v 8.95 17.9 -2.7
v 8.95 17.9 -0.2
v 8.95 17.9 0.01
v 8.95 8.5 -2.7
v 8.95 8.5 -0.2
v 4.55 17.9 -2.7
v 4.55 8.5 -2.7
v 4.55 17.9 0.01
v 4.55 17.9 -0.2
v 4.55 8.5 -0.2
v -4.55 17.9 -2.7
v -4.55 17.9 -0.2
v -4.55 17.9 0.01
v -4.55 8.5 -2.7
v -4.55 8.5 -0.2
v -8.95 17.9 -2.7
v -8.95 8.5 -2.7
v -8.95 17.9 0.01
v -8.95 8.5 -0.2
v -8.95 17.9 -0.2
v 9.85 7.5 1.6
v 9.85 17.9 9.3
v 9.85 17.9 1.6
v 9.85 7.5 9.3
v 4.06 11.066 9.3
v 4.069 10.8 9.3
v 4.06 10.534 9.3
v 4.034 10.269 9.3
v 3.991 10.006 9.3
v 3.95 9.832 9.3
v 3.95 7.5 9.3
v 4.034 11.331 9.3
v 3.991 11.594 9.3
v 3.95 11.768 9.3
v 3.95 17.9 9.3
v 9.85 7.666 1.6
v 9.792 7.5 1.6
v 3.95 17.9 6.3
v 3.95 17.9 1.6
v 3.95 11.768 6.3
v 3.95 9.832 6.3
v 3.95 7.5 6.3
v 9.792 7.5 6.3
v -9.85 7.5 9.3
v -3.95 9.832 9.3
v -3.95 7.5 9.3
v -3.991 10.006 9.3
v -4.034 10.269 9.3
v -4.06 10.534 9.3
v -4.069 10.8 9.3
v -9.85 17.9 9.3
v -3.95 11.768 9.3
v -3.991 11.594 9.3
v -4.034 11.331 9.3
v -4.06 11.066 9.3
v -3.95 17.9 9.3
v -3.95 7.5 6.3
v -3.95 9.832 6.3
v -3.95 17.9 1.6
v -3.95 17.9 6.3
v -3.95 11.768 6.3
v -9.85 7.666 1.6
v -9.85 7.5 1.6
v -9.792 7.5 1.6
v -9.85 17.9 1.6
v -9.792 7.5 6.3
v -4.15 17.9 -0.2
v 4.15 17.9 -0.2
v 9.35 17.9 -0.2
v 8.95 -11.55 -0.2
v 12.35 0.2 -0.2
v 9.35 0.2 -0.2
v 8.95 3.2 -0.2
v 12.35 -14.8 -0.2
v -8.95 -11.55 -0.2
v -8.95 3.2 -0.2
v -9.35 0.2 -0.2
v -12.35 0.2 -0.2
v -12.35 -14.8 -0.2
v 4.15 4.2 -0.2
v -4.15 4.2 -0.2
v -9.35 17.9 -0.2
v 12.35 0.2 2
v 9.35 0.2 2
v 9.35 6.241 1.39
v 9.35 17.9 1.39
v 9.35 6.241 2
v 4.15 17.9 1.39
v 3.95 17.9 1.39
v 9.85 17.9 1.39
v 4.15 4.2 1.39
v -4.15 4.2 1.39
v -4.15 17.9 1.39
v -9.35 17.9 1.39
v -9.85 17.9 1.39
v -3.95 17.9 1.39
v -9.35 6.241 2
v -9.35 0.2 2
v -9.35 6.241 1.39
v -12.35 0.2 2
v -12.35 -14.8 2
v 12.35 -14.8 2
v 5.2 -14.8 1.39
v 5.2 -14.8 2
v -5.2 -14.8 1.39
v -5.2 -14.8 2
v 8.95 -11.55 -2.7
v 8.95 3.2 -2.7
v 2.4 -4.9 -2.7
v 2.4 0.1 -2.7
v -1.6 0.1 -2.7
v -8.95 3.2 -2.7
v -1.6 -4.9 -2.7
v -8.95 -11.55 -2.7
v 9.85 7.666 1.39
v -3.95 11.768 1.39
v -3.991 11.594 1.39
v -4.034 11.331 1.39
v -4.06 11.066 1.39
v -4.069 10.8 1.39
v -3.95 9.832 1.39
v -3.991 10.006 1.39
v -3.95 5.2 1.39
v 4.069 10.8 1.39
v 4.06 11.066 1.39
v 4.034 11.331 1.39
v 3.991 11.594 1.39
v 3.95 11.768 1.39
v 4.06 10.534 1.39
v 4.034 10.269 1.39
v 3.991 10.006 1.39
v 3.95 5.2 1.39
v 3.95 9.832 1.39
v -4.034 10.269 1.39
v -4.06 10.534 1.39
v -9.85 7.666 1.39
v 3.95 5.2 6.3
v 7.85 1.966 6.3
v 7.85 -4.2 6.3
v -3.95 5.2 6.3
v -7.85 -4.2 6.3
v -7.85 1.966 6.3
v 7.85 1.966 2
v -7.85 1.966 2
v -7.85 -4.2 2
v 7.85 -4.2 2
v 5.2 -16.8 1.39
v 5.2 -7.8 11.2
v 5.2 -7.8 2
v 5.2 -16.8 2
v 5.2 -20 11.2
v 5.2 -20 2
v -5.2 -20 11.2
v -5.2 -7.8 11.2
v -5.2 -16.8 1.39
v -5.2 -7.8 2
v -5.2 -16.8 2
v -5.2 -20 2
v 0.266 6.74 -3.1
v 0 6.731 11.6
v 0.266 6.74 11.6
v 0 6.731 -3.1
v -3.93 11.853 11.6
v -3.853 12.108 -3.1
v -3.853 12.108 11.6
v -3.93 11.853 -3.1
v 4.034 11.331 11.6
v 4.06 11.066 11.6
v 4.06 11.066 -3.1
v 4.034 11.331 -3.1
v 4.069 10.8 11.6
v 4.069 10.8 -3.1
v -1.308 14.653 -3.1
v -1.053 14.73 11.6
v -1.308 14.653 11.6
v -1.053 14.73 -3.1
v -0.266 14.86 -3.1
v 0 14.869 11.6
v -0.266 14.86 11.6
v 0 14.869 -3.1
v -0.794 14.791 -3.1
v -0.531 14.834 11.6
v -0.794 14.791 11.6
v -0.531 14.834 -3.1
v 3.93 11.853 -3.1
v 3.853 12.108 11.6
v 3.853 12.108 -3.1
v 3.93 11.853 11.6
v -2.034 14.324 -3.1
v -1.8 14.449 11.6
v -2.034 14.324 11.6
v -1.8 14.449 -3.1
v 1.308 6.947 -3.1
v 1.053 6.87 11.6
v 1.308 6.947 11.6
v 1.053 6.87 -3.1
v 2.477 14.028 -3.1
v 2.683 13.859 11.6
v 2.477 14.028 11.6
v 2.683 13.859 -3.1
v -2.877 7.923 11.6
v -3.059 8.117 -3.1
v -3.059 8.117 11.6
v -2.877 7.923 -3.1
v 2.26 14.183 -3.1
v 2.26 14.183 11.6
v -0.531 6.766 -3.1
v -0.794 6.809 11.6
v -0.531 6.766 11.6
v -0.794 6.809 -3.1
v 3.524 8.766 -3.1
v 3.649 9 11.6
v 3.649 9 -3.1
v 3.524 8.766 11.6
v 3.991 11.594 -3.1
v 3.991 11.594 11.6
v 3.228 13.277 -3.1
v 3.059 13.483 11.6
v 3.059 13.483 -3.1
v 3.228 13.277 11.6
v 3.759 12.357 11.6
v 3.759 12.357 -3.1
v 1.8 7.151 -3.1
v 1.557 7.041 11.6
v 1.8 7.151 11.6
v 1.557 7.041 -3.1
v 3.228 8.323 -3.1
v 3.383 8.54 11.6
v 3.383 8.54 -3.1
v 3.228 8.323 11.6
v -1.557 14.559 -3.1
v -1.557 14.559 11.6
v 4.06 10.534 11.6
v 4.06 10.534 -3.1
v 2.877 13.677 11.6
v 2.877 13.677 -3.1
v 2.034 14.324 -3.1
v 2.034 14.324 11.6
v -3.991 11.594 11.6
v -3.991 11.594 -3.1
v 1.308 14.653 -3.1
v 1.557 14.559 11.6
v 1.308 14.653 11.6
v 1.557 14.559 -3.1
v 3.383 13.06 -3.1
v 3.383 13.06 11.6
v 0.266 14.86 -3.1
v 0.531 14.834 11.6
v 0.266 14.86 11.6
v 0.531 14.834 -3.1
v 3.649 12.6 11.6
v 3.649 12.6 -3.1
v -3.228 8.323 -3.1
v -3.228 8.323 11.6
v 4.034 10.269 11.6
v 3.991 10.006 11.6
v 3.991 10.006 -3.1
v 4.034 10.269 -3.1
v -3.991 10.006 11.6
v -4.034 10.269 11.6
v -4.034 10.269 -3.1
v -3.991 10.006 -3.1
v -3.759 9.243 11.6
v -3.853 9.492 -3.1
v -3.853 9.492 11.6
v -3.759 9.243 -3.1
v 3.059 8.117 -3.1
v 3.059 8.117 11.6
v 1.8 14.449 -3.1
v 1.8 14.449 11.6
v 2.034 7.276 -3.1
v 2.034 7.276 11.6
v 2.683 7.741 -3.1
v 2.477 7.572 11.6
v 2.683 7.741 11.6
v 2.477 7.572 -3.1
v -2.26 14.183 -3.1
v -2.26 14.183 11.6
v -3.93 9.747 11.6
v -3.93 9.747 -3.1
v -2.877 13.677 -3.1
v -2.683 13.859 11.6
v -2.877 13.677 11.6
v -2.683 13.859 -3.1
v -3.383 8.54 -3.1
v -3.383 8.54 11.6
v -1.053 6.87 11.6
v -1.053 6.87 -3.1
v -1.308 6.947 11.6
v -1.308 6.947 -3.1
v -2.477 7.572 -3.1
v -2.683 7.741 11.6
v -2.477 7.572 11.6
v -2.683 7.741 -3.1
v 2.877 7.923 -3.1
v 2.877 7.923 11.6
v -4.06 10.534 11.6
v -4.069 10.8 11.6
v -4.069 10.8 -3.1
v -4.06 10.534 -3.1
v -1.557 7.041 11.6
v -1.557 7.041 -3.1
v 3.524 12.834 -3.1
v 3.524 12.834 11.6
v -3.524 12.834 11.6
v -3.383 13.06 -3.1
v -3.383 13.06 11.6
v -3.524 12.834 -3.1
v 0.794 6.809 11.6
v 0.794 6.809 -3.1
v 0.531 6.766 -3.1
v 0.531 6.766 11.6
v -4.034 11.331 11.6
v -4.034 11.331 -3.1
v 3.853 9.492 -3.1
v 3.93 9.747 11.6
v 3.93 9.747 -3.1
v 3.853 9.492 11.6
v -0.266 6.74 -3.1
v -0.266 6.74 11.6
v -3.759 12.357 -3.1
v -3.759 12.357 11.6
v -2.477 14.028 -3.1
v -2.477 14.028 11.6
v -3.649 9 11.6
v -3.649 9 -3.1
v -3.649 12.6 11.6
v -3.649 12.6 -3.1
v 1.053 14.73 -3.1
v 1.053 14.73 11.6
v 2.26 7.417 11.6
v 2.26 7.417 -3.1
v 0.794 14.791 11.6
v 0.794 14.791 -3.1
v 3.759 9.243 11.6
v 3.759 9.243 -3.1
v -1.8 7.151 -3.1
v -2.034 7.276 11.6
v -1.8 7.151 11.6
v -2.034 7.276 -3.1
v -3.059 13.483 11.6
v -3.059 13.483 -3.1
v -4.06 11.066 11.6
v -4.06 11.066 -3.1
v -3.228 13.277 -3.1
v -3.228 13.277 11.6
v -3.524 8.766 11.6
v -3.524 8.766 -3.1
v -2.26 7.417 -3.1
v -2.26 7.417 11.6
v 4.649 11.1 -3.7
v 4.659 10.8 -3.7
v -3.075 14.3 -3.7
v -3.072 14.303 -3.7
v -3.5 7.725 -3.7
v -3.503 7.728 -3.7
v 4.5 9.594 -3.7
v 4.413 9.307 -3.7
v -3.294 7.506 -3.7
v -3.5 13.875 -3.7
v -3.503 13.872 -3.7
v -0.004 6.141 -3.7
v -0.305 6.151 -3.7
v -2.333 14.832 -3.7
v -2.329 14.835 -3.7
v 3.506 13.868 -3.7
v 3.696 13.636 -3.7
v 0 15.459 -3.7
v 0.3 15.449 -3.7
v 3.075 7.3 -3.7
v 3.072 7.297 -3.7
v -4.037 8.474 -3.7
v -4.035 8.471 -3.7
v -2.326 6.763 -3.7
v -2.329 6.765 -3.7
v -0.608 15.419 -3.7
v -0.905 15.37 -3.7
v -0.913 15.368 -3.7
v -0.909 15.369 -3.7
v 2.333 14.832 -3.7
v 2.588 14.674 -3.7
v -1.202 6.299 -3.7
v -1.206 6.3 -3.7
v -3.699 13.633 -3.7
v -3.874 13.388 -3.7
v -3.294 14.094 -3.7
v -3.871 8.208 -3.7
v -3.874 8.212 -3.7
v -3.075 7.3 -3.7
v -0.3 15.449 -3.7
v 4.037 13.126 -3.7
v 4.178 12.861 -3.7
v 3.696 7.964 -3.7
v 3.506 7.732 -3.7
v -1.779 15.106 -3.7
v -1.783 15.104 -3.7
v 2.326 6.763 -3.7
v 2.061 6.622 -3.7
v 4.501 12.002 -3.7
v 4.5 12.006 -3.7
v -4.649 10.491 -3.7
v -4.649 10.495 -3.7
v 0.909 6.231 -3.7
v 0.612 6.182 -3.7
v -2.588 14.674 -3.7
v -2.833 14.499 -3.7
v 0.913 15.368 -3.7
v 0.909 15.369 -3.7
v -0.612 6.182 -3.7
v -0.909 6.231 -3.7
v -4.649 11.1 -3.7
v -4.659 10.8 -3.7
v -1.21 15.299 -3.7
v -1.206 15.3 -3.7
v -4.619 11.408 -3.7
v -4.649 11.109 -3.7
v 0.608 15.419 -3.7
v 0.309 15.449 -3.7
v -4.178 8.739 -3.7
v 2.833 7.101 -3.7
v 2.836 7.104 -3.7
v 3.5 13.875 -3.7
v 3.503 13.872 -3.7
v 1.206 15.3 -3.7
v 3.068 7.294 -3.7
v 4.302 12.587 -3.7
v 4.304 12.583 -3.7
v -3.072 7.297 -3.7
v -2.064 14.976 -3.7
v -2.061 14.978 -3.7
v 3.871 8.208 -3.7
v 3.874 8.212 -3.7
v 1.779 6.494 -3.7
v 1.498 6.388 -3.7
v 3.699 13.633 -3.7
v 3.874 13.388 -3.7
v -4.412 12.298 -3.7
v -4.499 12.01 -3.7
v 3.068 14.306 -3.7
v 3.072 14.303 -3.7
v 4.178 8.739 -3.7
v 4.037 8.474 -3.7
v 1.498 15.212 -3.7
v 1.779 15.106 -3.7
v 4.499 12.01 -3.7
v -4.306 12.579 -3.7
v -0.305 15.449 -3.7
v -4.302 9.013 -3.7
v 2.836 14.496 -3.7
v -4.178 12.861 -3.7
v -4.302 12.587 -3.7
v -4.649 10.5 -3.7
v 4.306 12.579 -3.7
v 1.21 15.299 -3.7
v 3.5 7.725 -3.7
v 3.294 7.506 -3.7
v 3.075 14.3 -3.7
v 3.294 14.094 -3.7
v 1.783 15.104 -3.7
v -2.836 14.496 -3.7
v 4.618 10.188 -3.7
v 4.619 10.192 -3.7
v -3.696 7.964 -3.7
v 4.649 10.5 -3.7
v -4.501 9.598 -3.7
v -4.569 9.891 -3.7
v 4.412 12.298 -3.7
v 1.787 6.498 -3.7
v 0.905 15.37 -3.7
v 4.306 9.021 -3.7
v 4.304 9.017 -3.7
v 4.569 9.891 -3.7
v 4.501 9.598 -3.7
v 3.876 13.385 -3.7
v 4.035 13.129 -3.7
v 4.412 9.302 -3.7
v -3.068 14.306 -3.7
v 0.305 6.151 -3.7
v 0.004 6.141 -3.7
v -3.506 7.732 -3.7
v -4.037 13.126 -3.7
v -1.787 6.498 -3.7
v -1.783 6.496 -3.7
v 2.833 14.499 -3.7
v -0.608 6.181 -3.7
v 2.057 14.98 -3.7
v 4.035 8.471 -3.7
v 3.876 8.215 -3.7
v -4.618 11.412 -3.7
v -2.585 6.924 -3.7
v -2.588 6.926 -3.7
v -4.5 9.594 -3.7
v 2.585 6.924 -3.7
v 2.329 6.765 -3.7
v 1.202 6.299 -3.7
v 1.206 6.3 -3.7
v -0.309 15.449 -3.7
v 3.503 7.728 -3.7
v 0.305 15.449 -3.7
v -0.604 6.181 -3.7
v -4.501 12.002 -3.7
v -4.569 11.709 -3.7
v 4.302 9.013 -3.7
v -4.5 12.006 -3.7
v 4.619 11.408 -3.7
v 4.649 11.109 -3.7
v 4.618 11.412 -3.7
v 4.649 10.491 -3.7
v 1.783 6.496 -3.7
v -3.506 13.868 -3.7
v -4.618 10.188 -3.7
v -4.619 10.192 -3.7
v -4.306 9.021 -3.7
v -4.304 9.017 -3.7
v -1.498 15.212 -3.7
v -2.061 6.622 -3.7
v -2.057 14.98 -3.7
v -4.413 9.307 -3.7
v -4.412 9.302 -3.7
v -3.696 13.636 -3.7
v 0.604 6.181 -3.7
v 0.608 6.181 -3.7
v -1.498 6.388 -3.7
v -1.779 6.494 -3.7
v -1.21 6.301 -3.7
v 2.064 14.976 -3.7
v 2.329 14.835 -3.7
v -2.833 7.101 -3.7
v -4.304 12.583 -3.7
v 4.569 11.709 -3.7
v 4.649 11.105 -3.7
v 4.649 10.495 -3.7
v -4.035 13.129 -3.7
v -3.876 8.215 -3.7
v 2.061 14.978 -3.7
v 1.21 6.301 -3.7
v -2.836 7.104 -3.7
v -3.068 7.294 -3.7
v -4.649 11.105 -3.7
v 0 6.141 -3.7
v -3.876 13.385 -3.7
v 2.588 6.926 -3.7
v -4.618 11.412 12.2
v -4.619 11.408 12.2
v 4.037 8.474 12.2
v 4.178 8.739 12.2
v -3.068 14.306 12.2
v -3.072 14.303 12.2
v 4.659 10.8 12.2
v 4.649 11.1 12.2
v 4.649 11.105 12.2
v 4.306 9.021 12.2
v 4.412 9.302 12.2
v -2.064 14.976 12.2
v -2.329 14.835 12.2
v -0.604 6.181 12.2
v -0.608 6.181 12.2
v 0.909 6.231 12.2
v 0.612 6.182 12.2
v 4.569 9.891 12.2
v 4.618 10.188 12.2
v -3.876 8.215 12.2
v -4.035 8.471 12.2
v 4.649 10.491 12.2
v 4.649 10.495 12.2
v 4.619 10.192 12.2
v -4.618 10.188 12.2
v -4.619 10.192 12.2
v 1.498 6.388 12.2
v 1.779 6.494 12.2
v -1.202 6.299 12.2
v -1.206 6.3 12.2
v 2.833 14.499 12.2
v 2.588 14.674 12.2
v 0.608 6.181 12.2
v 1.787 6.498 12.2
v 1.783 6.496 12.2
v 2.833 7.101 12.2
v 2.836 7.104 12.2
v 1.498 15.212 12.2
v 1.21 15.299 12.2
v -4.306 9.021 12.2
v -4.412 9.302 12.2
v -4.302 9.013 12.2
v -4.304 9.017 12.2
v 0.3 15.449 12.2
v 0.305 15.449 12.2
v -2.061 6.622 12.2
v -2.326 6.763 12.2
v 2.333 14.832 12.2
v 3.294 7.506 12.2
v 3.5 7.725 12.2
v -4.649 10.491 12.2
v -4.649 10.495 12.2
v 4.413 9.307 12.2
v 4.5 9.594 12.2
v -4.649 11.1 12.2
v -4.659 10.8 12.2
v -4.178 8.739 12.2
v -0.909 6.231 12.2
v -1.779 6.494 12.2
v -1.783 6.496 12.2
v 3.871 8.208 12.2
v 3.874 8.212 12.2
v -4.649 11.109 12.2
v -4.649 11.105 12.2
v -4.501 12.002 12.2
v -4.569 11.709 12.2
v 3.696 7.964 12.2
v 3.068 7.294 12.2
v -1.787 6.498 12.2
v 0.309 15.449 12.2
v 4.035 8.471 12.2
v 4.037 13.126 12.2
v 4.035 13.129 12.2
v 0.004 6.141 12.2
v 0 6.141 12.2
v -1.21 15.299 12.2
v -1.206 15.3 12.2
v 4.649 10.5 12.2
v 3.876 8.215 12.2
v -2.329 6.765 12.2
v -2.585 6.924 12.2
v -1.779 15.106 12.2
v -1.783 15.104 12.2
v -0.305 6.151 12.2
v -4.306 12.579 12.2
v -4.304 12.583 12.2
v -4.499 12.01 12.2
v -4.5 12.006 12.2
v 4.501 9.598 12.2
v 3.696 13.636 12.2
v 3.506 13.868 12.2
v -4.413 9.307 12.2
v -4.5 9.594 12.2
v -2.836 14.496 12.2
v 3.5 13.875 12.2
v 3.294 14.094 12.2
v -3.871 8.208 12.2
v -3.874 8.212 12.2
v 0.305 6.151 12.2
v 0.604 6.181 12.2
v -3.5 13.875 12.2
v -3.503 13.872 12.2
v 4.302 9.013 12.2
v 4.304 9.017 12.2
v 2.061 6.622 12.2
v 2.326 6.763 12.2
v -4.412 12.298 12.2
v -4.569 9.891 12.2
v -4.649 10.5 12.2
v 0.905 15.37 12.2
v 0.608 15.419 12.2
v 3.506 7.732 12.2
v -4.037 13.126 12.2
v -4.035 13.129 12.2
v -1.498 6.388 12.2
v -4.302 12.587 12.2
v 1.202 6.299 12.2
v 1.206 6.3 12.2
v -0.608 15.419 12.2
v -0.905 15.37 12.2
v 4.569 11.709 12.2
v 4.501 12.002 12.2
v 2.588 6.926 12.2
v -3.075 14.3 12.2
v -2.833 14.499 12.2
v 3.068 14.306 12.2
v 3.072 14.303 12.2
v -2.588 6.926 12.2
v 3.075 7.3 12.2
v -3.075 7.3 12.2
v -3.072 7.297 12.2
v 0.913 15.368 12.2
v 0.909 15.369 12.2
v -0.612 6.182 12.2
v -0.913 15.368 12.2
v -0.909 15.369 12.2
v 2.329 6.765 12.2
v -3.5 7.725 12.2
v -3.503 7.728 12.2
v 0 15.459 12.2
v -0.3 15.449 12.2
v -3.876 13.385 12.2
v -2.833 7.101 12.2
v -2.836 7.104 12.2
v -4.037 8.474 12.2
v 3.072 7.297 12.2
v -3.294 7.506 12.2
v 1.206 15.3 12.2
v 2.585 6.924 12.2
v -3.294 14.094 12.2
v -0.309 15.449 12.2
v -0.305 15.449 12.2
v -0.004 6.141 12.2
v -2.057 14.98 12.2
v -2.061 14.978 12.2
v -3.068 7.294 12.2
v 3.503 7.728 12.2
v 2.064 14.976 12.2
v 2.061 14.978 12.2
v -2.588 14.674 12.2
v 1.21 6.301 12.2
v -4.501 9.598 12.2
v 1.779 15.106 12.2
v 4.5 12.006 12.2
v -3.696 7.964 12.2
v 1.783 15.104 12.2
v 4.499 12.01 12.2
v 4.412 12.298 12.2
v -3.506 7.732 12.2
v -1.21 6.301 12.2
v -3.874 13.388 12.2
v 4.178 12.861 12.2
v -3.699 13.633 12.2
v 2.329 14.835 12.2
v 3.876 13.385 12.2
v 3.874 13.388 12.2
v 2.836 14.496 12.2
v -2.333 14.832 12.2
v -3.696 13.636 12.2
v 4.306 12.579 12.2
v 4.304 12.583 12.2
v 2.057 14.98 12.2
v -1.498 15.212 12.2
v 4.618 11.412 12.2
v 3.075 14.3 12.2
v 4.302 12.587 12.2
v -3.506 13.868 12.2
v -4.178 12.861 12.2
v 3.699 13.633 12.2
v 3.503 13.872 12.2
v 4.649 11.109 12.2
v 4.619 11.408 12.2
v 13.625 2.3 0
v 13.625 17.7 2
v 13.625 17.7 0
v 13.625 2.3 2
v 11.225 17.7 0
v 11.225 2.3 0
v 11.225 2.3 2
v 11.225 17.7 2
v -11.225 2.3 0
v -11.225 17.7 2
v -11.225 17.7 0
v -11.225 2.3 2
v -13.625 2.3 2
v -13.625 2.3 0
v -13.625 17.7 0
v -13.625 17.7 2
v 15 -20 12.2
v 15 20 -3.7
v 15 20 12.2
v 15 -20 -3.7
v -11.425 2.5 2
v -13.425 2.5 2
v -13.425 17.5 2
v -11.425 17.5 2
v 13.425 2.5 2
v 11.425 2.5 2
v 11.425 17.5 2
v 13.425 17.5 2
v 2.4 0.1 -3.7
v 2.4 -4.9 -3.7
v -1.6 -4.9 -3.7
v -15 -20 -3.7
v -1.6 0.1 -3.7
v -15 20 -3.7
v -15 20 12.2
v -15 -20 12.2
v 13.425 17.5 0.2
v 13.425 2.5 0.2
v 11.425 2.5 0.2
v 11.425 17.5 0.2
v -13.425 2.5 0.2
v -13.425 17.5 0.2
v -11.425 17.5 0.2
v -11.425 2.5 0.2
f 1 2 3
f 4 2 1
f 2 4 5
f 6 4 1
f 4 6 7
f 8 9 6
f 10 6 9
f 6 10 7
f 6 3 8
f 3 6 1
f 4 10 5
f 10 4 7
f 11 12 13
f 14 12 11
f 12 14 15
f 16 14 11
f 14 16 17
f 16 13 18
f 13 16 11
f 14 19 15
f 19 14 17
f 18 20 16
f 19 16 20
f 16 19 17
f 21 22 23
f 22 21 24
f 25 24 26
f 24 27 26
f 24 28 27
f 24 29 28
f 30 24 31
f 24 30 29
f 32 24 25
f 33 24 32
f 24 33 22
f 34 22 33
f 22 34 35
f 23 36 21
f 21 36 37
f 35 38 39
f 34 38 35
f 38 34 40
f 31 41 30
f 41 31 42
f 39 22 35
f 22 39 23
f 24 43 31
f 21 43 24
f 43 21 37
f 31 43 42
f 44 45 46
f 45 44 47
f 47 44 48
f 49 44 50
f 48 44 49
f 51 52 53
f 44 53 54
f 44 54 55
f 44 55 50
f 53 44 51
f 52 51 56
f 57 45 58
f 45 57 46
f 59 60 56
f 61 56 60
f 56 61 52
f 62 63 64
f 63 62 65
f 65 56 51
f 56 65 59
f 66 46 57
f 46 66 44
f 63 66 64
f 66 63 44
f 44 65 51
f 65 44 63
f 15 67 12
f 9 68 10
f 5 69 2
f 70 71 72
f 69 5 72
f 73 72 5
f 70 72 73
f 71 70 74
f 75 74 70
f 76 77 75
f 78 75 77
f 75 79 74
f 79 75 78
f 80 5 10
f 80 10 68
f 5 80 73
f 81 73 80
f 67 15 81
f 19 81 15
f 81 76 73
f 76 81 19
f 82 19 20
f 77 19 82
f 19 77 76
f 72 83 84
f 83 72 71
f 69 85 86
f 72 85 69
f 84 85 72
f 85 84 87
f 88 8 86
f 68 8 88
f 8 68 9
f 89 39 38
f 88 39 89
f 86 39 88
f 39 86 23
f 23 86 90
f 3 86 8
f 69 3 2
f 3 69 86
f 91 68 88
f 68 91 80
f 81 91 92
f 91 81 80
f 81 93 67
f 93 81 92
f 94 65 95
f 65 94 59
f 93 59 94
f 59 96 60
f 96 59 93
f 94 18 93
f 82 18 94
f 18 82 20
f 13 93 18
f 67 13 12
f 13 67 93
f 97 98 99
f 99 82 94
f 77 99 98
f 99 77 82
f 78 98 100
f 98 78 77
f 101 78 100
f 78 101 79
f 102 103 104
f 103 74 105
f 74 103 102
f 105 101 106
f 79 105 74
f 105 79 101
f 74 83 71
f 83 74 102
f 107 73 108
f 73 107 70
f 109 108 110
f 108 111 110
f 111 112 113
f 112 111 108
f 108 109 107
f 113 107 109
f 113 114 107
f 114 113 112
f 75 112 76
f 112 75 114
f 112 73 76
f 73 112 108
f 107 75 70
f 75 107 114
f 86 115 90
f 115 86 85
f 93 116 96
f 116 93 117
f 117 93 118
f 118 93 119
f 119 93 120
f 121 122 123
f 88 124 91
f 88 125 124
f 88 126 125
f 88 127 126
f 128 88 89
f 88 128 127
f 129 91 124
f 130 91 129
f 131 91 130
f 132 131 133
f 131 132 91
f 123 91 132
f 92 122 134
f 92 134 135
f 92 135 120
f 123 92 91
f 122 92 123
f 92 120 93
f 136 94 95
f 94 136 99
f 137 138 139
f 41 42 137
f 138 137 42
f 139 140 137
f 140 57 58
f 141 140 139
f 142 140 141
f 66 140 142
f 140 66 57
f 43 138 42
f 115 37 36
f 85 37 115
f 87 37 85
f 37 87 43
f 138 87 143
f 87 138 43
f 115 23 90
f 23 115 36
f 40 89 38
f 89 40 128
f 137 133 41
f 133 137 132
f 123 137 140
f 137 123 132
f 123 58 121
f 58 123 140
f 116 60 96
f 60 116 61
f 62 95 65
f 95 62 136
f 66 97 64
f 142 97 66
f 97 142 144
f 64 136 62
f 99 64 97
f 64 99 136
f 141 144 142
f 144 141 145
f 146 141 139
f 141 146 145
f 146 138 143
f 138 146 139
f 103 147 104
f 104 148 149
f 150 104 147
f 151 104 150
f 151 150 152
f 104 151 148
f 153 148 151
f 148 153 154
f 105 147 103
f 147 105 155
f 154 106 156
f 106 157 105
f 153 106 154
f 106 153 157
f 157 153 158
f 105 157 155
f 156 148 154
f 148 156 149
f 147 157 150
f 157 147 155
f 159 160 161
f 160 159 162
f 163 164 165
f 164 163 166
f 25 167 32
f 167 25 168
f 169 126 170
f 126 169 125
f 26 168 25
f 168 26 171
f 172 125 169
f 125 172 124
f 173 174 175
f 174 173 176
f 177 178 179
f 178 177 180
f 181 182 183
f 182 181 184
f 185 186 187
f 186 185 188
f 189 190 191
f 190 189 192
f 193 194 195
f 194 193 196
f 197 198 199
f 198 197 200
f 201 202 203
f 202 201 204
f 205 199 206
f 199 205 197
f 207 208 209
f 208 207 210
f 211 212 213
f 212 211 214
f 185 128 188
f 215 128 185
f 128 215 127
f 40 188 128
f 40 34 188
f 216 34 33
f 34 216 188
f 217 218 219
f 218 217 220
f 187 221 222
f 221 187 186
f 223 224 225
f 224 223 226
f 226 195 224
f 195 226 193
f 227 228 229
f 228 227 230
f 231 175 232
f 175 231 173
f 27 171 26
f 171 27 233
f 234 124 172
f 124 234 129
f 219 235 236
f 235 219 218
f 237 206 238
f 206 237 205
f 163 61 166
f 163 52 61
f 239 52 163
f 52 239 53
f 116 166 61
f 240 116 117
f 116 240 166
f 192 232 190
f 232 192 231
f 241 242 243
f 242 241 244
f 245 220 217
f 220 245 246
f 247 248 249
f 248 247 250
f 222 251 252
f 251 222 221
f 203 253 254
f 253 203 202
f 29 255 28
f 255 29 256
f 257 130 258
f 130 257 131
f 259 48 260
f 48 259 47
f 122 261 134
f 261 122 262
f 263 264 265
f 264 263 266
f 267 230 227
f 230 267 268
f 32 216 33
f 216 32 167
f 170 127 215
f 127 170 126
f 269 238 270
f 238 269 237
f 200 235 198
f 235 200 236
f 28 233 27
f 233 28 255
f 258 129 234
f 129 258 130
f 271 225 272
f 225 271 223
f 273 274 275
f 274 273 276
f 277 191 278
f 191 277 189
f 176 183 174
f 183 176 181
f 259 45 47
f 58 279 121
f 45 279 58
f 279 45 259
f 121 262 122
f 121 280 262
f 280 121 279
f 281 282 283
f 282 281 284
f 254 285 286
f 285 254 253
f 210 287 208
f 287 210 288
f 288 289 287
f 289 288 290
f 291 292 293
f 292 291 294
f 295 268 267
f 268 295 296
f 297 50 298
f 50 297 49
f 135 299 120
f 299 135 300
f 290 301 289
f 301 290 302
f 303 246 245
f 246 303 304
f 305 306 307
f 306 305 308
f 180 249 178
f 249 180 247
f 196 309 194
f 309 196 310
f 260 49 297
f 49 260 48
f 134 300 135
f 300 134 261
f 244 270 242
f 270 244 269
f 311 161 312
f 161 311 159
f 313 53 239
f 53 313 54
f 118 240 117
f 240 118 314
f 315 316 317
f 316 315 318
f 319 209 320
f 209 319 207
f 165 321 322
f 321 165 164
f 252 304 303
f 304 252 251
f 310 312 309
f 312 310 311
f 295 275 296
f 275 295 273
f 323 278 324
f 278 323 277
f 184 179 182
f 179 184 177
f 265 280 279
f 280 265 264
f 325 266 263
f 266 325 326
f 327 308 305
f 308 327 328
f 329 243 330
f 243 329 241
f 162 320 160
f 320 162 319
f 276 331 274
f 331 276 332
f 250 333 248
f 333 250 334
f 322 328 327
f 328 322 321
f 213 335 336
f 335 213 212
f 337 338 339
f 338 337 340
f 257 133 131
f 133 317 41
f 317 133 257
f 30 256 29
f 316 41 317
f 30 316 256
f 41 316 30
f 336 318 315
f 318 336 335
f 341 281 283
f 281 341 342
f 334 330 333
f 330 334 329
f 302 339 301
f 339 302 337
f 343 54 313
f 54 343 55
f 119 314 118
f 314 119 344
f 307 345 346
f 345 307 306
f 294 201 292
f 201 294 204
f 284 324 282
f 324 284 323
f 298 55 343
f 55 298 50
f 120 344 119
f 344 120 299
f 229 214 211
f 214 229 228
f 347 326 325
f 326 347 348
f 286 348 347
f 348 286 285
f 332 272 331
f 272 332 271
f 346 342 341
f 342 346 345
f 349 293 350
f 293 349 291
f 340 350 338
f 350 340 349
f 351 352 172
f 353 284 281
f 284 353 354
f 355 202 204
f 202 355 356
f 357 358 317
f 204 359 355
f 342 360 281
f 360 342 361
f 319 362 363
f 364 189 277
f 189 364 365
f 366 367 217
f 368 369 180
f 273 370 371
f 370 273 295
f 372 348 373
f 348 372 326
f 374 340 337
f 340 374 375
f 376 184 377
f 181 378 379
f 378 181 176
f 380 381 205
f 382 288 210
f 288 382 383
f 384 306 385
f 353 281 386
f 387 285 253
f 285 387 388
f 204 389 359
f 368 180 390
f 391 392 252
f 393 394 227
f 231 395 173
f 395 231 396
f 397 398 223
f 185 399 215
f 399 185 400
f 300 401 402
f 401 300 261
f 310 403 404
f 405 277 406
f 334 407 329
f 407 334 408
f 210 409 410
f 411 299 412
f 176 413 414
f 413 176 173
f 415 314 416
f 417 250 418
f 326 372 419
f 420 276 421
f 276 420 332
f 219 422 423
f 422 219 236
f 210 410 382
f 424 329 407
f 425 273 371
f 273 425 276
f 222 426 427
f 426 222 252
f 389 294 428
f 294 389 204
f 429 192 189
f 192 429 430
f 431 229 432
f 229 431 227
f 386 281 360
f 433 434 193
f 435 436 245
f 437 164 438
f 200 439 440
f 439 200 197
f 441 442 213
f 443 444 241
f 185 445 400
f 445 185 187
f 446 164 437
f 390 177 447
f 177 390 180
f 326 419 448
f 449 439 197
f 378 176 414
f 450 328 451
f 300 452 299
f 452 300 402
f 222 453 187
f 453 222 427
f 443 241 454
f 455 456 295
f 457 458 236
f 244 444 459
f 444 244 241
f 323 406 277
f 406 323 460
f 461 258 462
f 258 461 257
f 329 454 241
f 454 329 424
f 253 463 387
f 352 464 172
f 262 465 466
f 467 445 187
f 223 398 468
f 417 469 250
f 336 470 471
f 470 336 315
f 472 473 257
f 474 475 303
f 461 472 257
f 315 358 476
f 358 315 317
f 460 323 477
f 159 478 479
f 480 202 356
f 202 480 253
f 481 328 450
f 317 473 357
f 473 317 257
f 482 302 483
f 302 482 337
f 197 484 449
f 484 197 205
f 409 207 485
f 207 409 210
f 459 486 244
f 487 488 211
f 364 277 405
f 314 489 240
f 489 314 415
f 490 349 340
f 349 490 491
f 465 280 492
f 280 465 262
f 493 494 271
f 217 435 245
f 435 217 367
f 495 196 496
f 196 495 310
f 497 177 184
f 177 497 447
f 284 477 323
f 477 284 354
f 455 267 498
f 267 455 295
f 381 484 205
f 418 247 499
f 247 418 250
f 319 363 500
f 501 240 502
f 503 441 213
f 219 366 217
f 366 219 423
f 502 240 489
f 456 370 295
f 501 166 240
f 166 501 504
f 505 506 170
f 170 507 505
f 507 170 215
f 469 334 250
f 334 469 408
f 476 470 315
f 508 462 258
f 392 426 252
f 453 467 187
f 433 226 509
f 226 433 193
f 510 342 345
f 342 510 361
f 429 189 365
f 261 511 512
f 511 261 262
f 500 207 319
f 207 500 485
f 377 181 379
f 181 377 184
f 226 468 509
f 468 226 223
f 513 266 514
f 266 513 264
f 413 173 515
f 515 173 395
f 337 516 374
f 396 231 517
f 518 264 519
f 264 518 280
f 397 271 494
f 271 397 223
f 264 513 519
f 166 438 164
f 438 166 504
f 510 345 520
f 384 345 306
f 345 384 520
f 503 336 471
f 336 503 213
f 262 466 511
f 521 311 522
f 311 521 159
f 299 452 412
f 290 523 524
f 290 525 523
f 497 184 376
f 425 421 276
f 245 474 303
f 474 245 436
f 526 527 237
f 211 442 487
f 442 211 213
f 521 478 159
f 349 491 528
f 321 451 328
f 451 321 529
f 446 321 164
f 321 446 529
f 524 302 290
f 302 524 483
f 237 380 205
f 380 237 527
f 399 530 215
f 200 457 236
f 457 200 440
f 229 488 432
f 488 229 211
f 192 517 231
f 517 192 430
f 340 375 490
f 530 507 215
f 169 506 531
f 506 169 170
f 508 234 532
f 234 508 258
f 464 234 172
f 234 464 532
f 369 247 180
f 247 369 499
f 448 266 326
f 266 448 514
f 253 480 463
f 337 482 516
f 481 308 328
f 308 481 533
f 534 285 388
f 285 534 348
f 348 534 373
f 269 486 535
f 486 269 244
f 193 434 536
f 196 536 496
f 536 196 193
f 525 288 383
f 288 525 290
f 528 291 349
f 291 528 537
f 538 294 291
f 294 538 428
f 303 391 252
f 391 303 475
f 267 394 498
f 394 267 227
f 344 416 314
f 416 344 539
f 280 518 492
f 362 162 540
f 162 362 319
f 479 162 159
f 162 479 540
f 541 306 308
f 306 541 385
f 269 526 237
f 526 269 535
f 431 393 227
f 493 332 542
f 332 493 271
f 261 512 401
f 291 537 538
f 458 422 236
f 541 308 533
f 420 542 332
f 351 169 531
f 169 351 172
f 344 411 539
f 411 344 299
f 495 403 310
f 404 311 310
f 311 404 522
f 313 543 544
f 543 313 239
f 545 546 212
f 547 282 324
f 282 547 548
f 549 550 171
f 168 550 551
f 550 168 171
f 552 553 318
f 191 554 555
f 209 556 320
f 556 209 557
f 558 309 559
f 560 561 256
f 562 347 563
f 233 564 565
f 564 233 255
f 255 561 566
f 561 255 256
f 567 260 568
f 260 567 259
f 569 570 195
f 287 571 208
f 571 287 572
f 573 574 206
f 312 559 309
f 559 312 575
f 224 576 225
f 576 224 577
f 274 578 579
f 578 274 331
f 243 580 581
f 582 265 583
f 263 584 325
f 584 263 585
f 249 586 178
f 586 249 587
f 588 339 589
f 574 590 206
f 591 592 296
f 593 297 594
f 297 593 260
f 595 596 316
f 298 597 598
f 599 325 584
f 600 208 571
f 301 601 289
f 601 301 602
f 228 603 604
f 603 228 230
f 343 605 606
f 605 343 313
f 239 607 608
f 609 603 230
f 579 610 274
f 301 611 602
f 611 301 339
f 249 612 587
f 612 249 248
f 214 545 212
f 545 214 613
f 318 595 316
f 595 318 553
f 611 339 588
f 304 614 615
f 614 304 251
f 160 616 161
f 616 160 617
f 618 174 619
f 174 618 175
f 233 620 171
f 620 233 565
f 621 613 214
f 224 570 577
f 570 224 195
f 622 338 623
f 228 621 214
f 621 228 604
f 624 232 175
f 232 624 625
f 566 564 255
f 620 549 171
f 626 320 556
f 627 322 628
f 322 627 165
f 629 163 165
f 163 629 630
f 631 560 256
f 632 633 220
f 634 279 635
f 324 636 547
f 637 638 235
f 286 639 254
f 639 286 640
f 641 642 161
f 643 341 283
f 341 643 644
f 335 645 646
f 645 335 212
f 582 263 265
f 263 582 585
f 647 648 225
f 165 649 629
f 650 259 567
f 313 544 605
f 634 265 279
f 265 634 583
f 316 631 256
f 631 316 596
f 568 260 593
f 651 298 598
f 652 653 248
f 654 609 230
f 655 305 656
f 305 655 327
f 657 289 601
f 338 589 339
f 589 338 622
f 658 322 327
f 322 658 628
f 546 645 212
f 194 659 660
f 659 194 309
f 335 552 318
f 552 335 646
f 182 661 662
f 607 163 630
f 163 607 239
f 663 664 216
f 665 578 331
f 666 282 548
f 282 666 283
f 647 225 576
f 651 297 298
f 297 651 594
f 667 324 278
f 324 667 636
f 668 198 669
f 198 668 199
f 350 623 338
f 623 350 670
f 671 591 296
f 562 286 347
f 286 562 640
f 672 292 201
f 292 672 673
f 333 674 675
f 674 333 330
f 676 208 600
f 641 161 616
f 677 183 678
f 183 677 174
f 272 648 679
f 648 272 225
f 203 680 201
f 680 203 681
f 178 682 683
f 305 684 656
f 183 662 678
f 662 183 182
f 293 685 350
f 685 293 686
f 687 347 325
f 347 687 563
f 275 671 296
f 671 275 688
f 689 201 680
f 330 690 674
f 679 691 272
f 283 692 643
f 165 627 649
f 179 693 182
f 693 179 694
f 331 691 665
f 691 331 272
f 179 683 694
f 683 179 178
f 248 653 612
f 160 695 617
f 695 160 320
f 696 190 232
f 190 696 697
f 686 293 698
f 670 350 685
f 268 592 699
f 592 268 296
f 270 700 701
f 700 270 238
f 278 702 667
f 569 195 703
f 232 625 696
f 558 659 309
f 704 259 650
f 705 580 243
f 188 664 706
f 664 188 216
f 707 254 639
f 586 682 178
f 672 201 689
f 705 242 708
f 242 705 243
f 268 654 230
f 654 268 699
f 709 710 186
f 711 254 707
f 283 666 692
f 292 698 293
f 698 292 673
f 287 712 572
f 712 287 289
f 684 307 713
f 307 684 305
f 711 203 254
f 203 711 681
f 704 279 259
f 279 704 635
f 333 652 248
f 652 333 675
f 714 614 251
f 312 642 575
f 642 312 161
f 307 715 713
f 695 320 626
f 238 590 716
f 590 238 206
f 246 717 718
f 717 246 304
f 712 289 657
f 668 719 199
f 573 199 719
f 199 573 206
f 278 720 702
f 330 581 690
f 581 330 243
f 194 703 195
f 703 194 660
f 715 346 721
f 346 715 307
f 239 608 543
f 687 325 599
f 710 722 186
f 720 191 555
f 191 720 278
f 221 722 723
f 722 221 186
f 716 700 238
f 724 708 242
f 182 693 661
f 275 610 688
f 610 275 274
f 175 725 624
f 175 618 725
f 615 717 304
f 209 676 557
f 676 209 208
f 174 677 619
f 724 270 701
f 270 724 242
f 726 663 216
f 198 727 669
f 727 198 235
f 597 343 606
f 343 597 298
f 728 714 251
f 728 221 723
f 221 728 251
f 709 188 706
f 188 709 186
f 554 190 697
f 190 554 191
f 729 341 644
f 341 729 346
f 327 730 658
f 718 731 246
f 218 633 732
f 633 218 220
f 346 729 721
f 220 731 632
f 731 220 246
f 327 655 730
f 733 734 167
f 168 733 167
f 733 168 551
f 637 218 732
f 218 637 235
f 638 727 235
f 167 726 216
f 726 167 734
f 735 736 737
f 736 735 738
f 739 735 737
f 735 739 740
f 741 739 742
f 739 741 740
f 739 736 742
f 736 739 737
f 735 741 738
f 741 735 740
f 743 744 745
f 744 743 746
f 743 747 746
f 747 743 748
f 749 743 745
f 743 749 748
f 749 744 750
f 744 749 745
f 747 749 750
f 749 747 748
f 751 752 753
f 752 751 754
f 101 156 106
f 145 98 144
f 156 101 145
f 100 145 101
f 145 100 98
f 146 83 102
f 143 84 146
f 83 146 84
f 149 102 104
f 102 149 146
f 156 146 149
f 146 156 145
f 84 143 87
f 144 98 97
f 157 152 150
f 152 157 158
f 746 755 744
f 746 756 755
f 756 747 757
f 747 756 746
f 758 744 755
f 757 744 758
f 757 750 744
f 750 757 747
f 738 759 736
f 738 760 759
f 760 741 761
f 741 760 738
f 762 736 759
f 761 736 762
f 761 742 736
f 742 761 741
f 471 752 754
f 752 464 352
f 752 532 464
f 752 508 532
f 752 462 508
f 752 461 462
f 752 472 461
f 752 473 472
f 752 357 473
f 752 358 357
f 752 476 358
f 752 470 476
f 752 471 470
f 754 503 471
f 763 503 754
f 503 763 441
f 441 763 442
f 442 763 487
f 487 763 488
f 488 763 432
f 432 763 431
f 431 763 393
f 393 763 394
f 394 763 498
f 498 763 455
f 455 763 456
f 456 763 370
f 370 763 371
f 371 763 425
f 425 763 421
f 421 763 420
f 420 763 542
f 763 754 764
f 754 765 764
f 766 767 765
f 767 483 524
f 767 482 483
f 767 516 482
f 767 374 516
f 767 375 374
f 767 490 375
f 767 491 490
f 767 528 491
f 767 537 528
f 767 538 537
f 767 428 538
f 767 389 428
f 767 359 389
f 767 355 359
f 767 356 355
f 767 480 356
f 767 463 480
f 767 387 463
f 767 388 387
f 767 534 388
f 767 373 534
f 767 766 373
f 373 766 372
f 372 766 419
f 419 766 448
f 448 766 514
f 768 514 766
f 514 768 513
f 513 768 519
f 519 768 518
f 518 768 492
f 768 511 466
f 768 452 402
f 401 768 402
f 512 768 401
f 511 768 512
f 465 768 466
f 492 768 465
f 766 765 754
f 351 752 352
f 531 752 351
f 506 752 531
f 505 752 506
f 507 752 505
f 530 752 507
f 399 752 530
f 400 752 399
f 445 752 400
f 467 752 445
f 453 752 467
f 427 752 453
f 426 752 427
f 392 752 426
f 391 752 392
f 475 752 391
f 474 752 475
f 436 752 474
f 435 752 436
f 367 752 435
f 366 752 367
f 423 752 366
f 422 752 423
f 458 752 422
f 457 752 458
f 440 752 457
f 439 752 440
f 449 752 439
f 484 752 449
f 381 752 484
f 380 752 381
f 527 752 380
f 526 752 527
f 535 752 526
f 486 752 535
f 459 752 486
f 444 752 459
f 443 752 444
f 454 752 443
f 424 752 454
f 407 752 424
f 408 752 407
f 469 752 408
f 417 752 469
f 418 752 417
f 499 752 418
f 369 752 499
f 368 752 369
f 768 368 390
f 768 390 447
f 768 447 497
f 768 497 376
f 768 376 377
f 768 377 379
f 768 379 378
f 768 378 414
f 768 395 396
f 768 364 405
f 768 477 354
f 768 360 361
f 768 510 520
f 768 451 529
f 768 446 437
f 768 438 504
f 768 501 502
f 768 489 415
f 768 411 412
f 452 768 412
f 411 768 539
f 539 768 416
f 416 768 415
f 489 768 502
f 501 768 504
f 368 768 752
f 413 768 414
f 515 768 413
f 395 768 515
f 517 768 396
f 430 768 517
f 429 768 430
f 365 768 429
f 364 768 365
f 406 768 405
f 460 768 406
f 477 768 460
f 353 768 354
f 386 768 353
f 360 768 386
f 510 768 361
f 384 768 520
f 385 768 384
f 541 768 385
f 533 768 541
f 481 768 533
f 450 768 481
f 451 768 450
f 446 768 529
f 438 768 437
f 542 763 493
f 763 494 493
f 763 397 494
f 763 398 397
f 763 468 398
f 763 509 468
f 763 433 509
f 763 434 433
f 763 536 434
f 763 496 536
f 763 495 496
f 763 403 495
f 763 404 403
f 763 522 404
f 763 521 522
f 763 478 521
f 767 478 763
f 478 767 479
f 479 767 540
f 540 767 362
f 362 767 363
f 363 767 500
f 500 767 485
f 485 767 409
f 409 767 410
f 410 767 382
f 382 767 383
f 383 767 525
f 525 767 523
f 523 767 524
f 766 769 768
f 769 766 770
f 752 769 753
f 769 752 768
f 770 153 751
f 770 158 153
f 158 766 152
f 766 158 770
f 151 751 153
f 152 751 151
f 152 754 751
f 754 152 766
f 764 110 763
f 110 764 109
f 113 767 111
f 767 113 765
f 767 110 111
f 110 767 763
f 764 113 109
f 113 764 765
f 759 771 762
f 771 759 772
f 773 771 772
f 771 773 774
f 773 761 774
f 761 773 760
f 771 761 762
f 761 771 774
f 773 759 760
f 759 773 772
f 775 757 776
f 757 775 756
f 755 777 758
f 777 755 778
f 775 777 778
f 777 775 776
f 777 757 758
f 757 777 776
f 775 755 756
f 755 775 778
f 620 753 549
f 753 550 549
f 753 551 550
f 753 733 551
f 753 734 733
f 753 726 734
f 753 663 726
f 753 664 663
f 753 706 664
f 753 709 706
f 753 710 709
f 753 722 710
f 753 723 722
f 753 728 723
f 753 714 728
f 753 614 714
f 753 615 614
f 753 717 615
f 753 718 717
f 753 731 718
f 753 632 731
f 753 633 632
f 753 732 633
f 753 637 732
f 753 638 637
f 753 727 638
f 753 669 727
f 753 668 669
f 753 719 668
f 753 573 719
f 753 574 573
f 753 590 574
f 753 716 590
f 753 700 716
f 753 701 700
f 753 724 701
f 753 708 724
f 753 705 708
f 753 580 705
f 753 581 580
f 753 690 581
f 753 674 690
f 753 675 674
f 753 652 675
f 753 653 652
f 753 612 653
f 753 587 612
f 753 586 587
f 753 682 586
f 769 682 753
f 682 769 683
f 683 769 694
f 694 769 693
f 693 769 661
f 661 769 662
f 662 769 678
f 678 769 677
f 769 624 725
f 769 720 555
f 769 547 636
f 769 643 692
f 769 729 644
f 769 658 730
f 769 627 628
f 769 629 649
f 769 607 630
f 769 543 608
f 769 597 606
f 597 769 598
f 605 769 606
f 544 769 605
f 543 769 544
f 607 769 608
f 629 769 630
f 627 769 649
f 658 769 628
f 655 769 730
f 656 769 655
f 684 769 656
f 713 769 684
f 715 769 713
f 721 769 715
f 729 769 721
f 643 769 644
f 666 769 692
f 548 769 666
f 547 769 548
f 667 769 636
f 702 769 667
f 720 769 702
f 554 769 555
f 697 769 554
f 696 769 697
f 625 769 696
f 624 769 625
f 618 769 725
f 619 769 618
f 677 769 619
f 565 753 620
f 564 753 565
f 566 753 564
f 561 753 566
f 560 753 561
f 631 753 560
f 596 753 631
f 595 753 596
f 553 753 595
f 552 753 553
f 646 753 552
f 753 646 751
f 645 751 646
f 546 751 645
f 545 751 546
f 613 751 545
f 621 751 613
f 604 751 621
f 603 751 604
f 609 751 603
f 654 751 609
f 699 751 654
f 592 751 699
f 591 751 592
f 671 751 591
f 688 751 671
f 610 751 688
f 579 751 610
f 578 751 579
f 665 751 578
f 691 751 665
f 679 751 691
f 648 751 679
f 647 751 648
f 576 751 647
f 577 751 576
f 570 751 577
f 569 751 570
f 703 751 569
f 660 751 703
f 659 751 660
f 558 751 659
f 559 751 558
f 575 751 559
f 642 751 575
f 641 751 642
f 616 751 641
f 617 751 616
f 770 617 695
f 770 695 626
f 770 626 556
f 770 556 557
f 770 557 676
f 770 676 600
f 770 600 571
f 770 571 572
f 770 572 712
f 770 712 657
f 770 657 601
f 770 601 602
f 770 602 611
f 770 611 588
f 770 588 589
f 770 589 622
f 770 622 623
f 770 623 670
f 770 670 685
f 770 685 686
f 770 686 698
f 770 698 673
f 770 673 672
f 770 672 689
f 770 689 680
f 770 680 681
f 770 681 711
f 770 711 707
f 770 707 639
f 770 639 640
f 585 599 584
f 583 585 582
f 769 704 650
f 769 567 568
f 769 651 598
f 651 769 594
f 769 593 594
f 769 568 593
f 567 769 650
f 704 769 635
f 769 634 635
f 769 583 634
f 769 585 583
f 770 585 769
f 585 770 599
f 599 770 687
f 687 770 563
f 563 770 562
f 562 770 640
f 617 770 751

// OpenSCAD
// file: ../probe/probe.scad
// Library model of the probe board inside an Amphenol TSW-10 or TST-10 turbidity probe (the board
// is the same in both), for building cases around. It draws nothing itself.
//
// The board: a PCB with an emitter and a detector head on a U-shaped bracket, facing each other
// across a slot, and a right-angle 3-pin connector at the other end. A clear tube runs vertically
// through the slot, between the heads.
//
// Frame: origin on the PCB centreline, z = 0 at the PCB underside, +y toward the head arms, -y
// toward the connector, whose plug enters from -y.
//
// The dimensions come from a CAD model drawn from caliper measurements, and matched the board
// used for the tube case. After remeasuring, change them here and every case follows. The
// heights of the bracket and the heads were measured from the top face of the PCB, and are
// stored that way.
//
// Use it with `use <probe.scad>`:
//   probe(c)               the board grown by c on every side, to subtract from a case
//   probe_outline()        the PCB outline (2D), to open a pocket to a parting plane
//   probe_bbox(c)          [[x0, y0, z0], [x1, y1, z1]] of probe(c)
//   probe_optical_axis()   [x, y] where a tube passes between the heads
//   probe_gap()            the gap between the inner faces of the heads: the widest tube that fits
//   probe_heads()          [x0, x1, y0, y1, z1]: inner and outer faces of one head, its y extent
//                          (the other head mirrors it in x) and its top
//   probe_pcb()            [thickness, half-width of the body, the y where it narrows to the arms]
//   probe_connector()      [half-width, plug face y, back face y, top z]
//   probe_trimmer()        [x, y] of the RV trimmer centre, under the PCB

// PCB thickness
pcb_t = 1.60;
// half-width of the PCB body
pcb_hw = 12.15;
// connector-end edge (y)
pcb_y0 = -14.6;
// where the PCB narrows to the two arms (y)
pcb_neck_y = 0.0;
// arm inner edge (half the slot width)
pcb_arm_x0 = 4.35;
// arm outer edge
pcb_arm_x1 = 9.15;
// bottom of the PCB slot (y)
pcb_slot_y = 4.0;
// arm tips (y)
pcb_y1 = 17.7;

// height of the black head bracket above the top face of the PCB
bracket_h = 4.5;
// bracket root edge (y)
bracket_y0 = -4.0;
// bracket half-width at the root
bracket_hw0 = 7.65;
// the root widens to the head width from here (y)
flare_y0 = 2.0;
// to here (y)
flare_y1 = 7.7;
// head inner face (half the optical gap)
head_x0 = 4.15;
// head outer face
head_x1 = 9.65;
// bottom of the bracket slot (y)
bracket_slot_y = 5.0;

// height of the emitter and detector heads above the top face of the PCB, over y flare_y1..pcb_y1
head_h = 7.5;

// Optical axis of the emitter and detector along the arms (y): the centre of the lens windows on
// the inner faces of the heads, measured from the root of the arms. The windows are 1.4 wide by
// 2.6 tall.
optical_y = 10.8;

// right-angle connector half-width; the plug enters from -y
conn_hw = 5.0;
// connector plug face (y)
conn_y0 = -16.6;
// connector back face (y)
conn_y1 = -8.0;
// connector top (z)
conn_top = 11.0;

// depth of the solder joints, trimmer and legs below the PCB
under_d = 2.5;
// main underside relief half-width
under_hw = 8.75;
// main relief start (y)
under_y0 = -11.35;
// main relief end (y)
under_y1 = 3.0;
// inner edge of the relief under each arm
under_arm_x0 = 4.75;
// start of the relief under each arm (y)
under_arm_y0 = 8.7;
// RV trimmer centre, underside (x)
trim_x = 0.4;
// RV trimmer centre, underside (y)
trim_y = -2.4;

eps = 0.01;

bracket_top = pcb_t + bracket_h;
head_top = pcb_t + head_h;

function probe_optical_axis() = [0, optical_y];
function probe_gap() = 2 * head_x0;
function probe_heads() = [head_x0, head_x1, flare_y1, pcb_y1, head_top];
function probe_pcb() = [pcb_t, pcb_hw, pcb_neck_y];
function probe_connector() = [conn_hw, conn_y0, conn_y1, conn_top];
function probe_trimmer() = [trim_x, trim_y];
function probe_bbox(c = 0) =
  let (hw = max(pcb_hw, bracket_hw0, head_x1, conn_hw, under_hw) + c)
    [
      [-hw, min(pcb_y0, conn_y0, under_y0) - c, -under_d - c],
      [hw, pcb_y1 + c, max(conn_top, head_top, bracket_top, pcb_t) + c],
    ];

module probe_mirror_x() {
  children();
  mirror([1, 0, 0]) children();
}

// Cuboid between two corners.
module probe_box(p0, p1) {
  translate(p0) cube(p1 - p0);
}

module probe_outline() {
  polygon(
    [
      [-pcb_hw, pcb_y0],
      [pcb_hw, pcb_y0],
      [pcb_hw, pcb_neck_y],
      [pcb_arm_x1, pcb_neck_y],
      [pcb_arm_x1, pcb_y1],
      [pcb_arm_x0, pcb_y1],
      [pcb_arm_x0, pcb_slot_y],
      [-pcb_arm_x0, pcb_slot_y],
      [-pcb_arm_x0, pcb_y1],
      [-pcb_arm_x1, pcb_y1],
      [-pcb_arm_x1, pcb_neck_y],
      [-pcb_hw, pcb_neck_y],
    ]
  );
}

module probe_bracket_outline() {
  polygon(
    [
      [-bracket_hw0, bracket_y0],
      [bracket_hw0, bracket_y0],
      [bracket_hw0, flare_y0],
      [head_x1, flare_y1],
      [head_x1, pcb_y1],
      [head_x0, pcb_y1],
      [head_x0, bracket_slot_y],
      [-head_x0, bracket_slot_y],
      [-head_x0, pcb_y1],
      [-head_x1, pcb_y1],
      [-head_x1, flare_y1],
      [-bracket_hw0, flare_y0],
    ]
  );
}

// The board, grown by c on every side. c = 0 is the board itself.
module probe(c = 0) {
  // PCB
  translate([0, 0, -c]) linear_extrude(pcb_t + 2 * c) offset(delta=c) probe_outline();
  // underside relief
  probe_box([-under_hw - c, under_y0 - c, -under_d - c], [under_hw + c, under_y1 + c, eps]);
  probe_mirror_x()
    probe_box([under_arm_x0 - c, under_arm_y0 - c, -under_d - c], [under_hw + c, pcb_y1 + c, eps]);
  // bracket and heads; the bracket and the connector overhang the PCB edge,
  // so they get clearance underneath too
  translate([0, 0, pcb_t - c - eps])
    linear_extrude(bracket_top - pcb_t + 2 * c + eps) offset(delta=c) probe_bracket_outline();
  probe_mirror_x() probe_box([head_x0 - c, flare_y1 - c, pcb_t], [head_x1 + c, pcb_y1 + c, head_top + c]);
  // connector
  probe_box([-conn_hw - c, conn_y0 - c, pcb_t - c - eps], [conn_hw + c, conn_y1 + c, conn_top + c]);
}
// main file
// Tube case: a printed case for the bare DFRobot SEN0189 probe board.
//
// The stock probe housing is removed. The bare probe PCB (emitter and detector
// heads on a U-shaped bracket, right-angle 3-pin connector) drops into the base,
// the lid closes over it, and a clear tube runs vertically through the optical
// slot between the heads.
//
// Frame: origin on the PCB centreline, z = 0 at the PCB underside, +y toward the
// head arms, -y toward the connector. The base sits below z = split_z, the lid above.
//
// Every pocket in both parts is cut from one board envelope grown by `clr`, so the
// two parts always agree on where the board is. The board, its envelope and its
// dimensions are defined in ../probe/probe.scad. This file adds only the case
// parameters.
//
// Export both parts with `just tube-case`.

use <../probe/probe.scad>

/* [Output] */

// which part(s) to render; "none" renders nothing, for files that include this one
part = "assembly"; // [assembly, base, lid, none]
// print: lay base or lid flat side down at z = 0 (ignored for the assembly)
orient = "assembly"; // [assembly, print]

/* [Fit] */
// clearance around the board envelope, per side
clr = 0.2; // [0:0.05:0.5]
// 5/16 in clear tube, nominal outside diameter
tube_od = 7.9375; // [5:0.0025:8.2]
// added to tube_od for the bore diameter
tube_fit = 0.2; // [0:0.05:0.8]
// 45 degree chamfer at each outer end of the tube bore
lead_in = 0.6; // [0:0.1:1.5]
// Number of facets for circular features (higher = smoother)
facets = 96; // [24:8:192]

/* [Case] */
// outside width (x)
case_w = 30;
// outside length (y)
case_l = 40;
// floor below the underside relief
floor_t = 1.0;
// roof above the connector pocket
roof_t = 1.0;
// base/lid parting plane; the PCB top is probe_pcb()[0], so the PCB sits recessed
split_z = 2.0;
// hole under the RV trimmer; before turning RV, mark its position and take air, clear and dark references in this case (docs/hardware.md)
access_hole = true;
// access hole width (x)
access_w = 4.0;
// access hole length (y)
access_l = 5.0;

/* [Alignment keys] */
// key start (y)
key_y0 = 2.5;
// key end (y)
key_y1 = 17.5;
// key width
key_w = 2.0;
// ridge height below the lid; the groove is key_h + key_clr deep
key_h = 1.8;
// clearance around the keys, per side
key_clr = 0.2; // [0:0.05:0.5]

/* [Hidden] */
eps = 0.01;
// thinnest wall the asserts below accept
min_wall = 0.8;

// the board pocket, including clearance
pocket = probe_bbox(clr);
bot_z = pocket[0][2] - floor_t;
top_z = pocket[1][2] + roof_t;
bore_d = tube_od + tube_fit;
// the tube on the optical axis of the board
tube_y = probe_optical_axis()[1];
// key centreline, halfway between the head pocket and the outer wall
key_x = (case_w / 2 + probe_heads()[1] + clr) / 2;
// widest pocket half-width and pocket y extents
pocket_hw = pocket[1][0];
pocket_y0 = pocket[0][1];
pocket_y1 = pocket[1][1];

assert(tube_od < probe_gap(), "tube_od: the tube must fit between the heads (probe_gap())");
assert(min(floor_t, roof_t) >= min_wall, "floor_t, roof_t: thinner than min_wall");
assert(case_w / 2 - pocket_hw >= min_wall, "case_w: the side walls are thinner than min_wall");
assert(
  pocket_y0 + case_l / 2 >= min_wall && case_l / 2 - pocket_y1 >= min_wall,
  "case_l: the end walls are thinner than min_wall"
);
assert(
  tube_y + bore_d / 2 + lead_in + min_wall <= case_l / 2,
  "tube_y, tube_od: the tube bore breaks through the end wall"
);
assert(lead_in < min(split_z - bot_z, top_z - split_z), "lead_in: deeper than a part is thick");
assert(
  key_x - key_w / 2 - key_clr - (probe_heads()[1] + clr) >= min_wall
  && case_w / 2 - (key_x + key_w / 2 + key_clr) >= min_wall,
  "key_w, key_clr: the key groove walls are thinner than min_wall"
);
assert(
  key_y0 < key_y1 && key_y0 - key_clr - (probe_pcb()[2] + clr) >= min_wall
  && case_l / 2 - (key_y1 + key_clr) >= min_wall,
  "key_y0, key_y1: the keys must run along the arms, clear of the PCB body and the end wall"
);
assert(
  split_z - key_h - key_clr - bot_z >= min_wall,
  "key_h: the key groove breaks through the floor"
);

module mirror_x() {
  children();
  mirror([1, 0, 0]) children();
}

// Cuboid between two corners.
module box(p0, p1) {
  translate(p0) cube(p1 - p0);
}

// The case outline, from z0 to z1.
module slab(z0, z1) {
  box([-case_w / 2, -case_l / 2, z0], [case_w / 2, case_l / 2, z1]);
}

// Lay a part flat for printing when orient = "print": flip it if asked, then lift it by lift.
module pose(lift, flip = false) {
  if (orient == "print")
    translate([0, 0, lift]) rotate([flip ? 180 : 0, 0, 0]) children();
  else
    children();
}

module tube_bore() {
  $fn = facets;
  translate([0, tube_y, bot_z - 1]) cylinder(d=bore_d, h=top_z - bot_z + 2);
  translate([0, tube_y, bot_z - eps])
    cylinder(d1=bore_d + 2 * lead_in, d2=bore_d, h=lead_in + eps);
  translate([0, tube_y, top_z - lead_in])
    cylinder(d1=bore_d, d2=bore_d + 2 * lead_in, h=lead_in + eps);
}

// The lid alignment keys, grown by c on every side except the top. c = key_clr cuts the grooves.
module keys(c = 0) {
  mirror_x() box(
      [key_x - key_w / 2 - c, key_y0 - c, split_z - key_h - c],
      [key_x + key_w / 2 + c, key_y1 + c, split_z + eps]
    );
}

module base() {
  difference() {
    slab(bot_z, split_z);
    probe(clr);
    // open the PCB pocket to the parting plane so the board drops in
    linear_extrude(split_z + 1) offset(delta=clr) probe_outline();
    tube_bore();
    keys(key_clr);
    if (access_hole)
      box(
        [probe_trimmer()[0] - access_w / 2, probe_trimmer()[1] - access_l / 2, bot_z - 1],
        [probe_trimmer()[0] + access_w / 2, probe_trimmer()[1] + access_l / 2, 0]
      );
  }
}

module lid() {
  difference() {
    union() {
      slab(split_z, top_z);
      keys();
    }
    probe(clr);
    // connector window: the plug enters through the -y wall
    conn = probe_connector();
    box([-conn[0] - clr, -case_l / 2 - 1, split_z - 1], [conn[0] + clr, conn[2], conn[3] + clr]);
    tube_bore();
  }
}

module tube() {
  translate([0, tube_y, bot_z - 5]) cylinder(d=tube_od, h=top_z - bot_z + 10, $fn=facets);
}

if (part == "base") {
  pose(-bot_z) base();
} else if (part == "lid") {
  pose(top_z, flip=true) lid();
} else if (part == "none") {
  // include <tube_case.scad> for the modules and dimensions without geometry
} else {
  color("orange") base();
  color("gray", 0.5) lid();
  %probe();
  %tube();
}
